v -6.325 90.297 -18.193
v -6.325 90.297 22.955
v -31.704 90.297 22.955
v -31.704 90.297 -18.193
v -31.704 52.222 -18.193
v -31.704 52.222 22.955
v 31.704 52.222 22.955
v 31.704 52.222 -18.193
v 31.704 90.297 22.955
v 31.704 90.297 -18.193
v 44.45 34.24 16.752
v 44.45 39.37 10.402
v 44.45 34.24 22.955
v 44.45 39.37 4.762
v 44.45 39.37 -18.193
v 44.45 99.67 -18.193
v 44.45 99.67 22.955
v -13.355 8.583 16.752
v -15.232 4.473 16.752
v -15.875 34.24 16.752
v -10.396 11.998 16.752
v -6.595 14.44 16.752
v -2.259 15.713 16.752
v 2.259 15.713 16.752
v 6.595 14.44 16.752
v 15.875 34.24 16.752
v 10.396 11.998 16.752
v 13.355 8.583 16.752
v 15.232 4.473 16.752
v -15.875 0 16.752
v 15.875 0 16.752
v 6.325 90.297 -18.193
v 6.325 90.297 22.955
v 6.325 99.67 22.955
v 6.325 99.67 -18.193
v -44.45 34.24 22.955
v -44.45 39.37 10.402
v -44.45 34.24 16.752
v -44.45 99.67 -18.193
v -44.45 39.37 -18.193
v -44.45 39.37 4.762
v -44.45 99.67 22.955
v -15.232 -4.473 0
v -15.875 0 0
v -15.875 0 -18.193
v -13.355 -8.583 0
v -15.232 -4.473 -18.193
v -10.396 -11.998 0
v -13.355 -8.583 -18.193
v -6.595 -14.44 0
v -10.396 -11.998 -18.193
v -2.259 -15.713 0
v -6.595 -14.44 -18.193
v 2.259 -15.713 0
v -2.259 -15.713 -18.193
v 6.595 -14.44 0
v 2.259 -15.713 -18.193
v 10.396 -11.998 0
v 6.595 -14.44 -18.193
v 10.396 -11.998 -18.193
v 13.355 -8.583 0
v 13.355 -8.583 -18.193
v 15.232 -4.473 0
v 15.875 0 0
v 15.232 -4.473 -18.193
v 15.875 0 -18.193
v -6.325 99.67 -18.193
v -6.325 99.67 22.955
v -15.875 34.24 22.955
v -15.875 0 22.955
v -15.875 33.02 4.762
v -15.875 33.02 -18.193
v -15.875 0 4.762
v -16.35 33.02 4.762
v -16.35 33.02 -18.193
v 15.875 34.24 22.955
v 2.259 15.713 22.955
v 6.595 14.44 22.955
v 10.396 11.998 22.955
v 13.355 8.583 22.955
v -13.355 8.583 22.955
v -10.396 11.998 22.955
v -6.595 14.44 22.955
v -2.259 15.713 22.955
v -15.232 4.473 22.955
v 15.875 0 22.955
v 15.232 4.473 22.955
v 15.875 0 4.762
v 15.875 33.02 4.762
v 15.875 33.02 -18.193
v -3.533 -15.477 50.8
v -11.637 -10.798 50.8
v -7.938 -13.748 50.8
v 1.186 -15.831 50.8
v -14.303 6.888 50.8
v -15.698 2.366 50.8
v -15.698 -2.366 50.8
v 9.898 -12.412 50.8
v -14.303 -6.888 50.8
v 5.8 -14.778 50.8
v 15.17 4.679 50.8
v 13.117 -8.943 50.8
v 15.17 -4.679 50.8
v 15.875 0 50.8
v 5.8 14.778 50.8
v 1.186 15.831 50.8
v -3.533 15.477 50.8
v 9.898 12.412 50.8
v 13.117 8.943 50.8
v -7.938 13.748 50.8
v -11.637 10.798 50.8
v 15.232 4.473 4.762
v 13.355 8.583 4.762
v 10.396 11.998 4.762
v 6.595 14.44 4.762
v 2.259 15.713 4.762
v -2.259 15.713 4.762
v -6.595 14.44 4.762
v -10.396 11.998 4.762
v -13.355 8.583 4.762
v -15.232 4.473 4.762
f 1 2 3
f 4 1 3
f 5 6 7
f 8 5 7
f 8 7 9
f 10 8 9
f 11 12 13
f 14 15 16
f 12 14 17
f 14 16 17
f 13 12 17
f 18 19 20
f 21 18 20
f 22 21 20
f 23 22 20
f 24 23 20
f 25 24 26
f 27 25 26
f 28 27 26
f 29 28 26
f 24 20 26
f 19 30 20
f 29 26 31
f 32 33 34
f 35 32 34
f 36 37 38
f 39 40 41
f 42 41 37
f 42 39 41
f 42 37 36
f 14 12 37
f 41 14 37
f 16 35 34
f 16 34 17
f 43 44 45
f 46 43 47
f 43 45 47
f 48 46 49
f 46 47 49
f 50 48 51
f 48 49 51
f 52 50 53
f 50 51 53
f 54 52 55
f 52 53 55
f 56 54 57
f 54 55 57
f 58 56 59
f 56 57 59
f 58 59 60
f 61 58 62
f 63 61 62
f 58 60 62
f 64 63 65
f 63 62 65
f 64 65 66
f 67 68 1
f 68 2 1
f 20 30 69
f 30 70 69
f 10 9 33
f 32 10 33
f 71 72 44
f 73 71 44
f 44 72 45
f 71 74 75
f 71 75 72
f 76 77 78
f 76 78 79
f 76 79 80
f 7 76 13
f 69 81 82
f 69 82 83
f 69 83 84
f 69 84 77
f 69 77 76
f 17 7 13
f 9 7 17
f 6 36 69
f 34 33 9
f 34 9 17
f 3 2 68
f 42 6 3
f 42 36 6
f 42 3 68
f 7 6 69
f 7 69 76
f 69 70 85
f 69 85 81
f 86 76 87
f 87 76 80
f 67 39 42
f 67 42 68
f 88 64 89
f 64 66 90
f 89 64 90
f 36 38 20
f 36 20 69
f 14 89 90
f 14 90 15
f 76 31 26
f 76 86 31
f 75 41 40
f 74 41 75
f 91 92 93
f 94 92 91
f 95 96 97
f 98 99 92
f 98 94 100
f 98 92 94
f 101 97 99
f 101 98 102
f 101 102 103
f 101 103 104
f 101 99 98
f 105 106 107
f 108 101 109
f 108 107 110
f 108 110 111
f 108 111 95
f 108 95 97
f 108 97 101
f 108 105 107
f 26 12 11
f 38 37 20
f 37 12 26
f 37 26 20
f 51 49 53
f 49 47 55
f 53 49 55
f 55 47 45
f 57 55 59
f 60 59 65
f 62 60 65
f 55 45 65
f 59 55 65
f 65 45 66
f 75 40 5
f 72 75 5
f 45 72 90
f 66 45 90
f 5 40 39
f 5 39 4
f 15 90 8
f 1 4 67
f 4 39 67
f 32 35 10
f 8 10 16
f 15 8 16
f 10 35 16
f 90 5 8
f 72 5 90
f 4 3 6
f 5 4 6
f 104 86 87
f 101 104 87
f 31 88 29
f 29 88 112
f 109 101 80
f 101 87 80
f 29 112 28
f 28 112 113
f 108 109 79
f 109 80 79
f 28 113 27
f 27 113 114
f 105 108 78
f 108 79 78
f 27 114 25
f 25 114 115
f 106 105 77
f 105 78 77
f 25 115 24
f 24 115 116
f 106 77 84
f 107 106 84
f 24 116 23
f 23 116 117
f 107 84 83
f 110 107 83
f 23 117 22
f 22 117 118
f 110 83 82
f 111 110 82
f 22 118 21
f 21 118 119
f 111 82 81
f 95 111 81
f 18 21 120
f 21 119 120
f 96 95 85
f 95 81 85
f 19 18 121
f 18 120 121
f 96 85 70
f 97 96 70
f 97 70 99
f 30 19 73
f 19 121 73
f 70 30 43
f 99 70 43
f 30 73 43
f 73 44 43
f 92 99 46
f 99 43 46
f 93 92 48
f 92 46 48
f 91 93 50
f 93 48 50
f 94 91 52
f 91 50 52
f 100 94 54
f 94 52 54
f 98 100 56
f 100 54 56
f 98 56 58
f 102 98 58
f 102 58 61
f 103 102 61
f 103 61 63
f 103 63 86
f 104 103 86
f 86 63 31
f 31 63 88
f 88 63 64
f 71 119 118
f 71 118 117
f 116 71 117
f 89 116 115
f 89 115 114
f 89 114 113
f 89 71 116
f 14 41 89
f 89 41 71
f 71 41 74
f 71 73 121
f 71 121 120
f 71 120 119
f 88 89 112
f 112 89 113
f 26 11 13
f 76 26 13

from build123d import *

# Parameters (mm, degrees)
SKETCH1_R                = 15.875
BOSS_EXTRUDE1_DEPTH      = 50.8
SKETCH2_W                = 31.75
SKETCH2_H                = 50.8
BOSS_EXTRUDE2_DEPTH      = 4.7625
SKETCH3_W                = 88.9
SKETCH3_H                = 41.148
BOSS_EXTRUDE3_DEPTH      = 41.2496
CUT_EXTRUDE2_DEPTH       = 111.191148756
BOSS_EXTRUDE4_REACH      = 96.879
BOSS_EXTRUDE4_END_RADIUS = 15.875
SKETCH12_W               = 31.75
SKETCH12_H               = 6.203370687
SKETCH13_W               = 31.75
SKETCH13_H               = 4.7625
BOSS_EXTRUDE5_DEPTH      = 11.43
SKETCH14_W               = 38.1254
SKETCH14_H               = 41.148
BOSS_EXTRUDE6_DEPTH      = 7.62
SKETCH20_W               = 31.75
SKETCH20_H               = 5.130323172
BOSS_EXTRUDE7_DEPTH      = 6.35
CUT_EXTRUDE3_DEPTH       = 128.097501113
BOSS_EXTRUDE8_START      = 18.19275
BOSS_EXTRUDE8_DEPTH      = 18.19275
SKETCH25_W               = 28.575
SKETCH25_H               = 22.95525
BOSS_EXTRUDE10_DEPTH     = 6.35
CUT_EXTRUDE4_DEPTH       = 119.44527458
BOSS_EXTRUDE11_DEPTH     = 28.575
BOSS_EXTRUDE12_DEPTH     = 28.575


with BuildPart() as part:
    # Sketch1 → Boss-Extrude1 (new body)
    with BuildSketch(Plane.XY):
        Circle(SKETCH1_R)
    extrude(amount=BOSS_EXTRUDE1_DEPTH)

    # Sketch2 → Boss-Extrude2 (add)
    with BuildSketch(Plane(origin=(0, 0, 0), x_dir=(-1, 0, 0), z_dir=(0, 0, -1))):
        with Locations((0, 25.4)):
            Rectangle(SKETCH2_W, SKETCH2_H)
    extrude(amount=-BOSS_EXTRUDE2_DEPTH)

    # Sketch3 → Boss-Extrude3 (add)
    with BuildSketch(Plane(origin=(0, 50.8, 0), x_dir=(1, 0, 0), z_dir=(0, 1, 0))):
        with Locations((0, -2.38125)):
            Rectangle(SKETCH3_W, SKETCH3_H)
    extrude(amount=BOSS_EXTRUDE3_DEPTH)

    # Sketch5 → Cut-Extrude2 (cut, through all)
    with BuildSketch(Plane.XY.offset(22.95525)):
        Polygon((-6.3246, 92.0496), (-6.3246, 90.297), (-31.70428, 90.297), (-31.70428, 52.2224), (31.70428, 52.2224), (31.70428, 90.297), (6.3246, 90.297), (6.3246, 92.0496), align=None)
    extrude(amount=-CUT_EXTRUDE2_DEPTH, mode=Mode.SUBTRACT)

    # Boss-Extrude4: up to this cylinder (the profile starts outside it)
    boss_extrude4_end = Plane(origin=(0, 0, 19.853565), z_dir=(0, 0, -1)) * Cylinder(BOSS_EXTRUDE4_END_RADIUS, 226.508, mode=Mode.PRIVATE)
    # Sketch12 → Boss-Extrude4 (add, up to the surface)
    with BuildSketch(Plane.XZ.offset(-50.8), mode=Mode.PRIVATE) as boss_extrude4_sk1:
        with Locations((0, 19.853564657)):
            Rectangle(SKETCH12_W, SKETCH12_H)
    boss_extrude4_tool1 = extrude(boss_extrude4_sk1.sketch, amount=BOSS_EXTRUDE4_REACH, mode=Mode.PRIVATE) - boss_extrude4_end
    add(boss_extrude4_tool1.solids().sort_by_distance((0, 50.8, 19.853565))[0])

    # Sketch13 → Boss-Extrude5 (add)
    with BuildSketch(Plane.XZ.offset(-50.8)):
        Polygon((-44.45, 22.95525), (-15.875, 22.95525), (-15.875, 16.751879313), (15.875, 16.751879313), (15.875, 22.95525), (44.45, 22.95525), (44.45, -18.19275), (-44.45, -18.19275), align=None)
        with Locations((0, 2.38125)):
            Rectangle(SKETCH13_W, SKETCH13_H, mode=Mode.SUBTRACT)
    extrude(amount=BOSS_EXTRUDE5_DEPTH)

    # Sketch14 → Boss-Extrude6 (add)
    with BuildSketch(Plane(origin=(0, 92.0496, 0), x_dir=(1, 0, 0), z_dir=(0, 1, 0))):
        with Locations((-25.3873, -2.38125)):
            Rectangle(SKETCH14_W, SKETCH14_H)
        with Locations((25.3873, -2.38125)):
            Rectangle(SKETCH14_W, SKETCH14_H)
    extrude(amount=BOSS_EXTRUDE6_DEPTH)

    # Sketch20 → Boss-Extrude7 (add)
    with BuildSketch(Plane(origin=(0, 0, 16.751879313), x_dir=(-1, 0, 0), z_dir=(0, 0, -1))):
        with Locations((0, 36.804838414)):
            Rectangle(SKETCH20_W, SKETCH20_H)
    extrude(amount=BOSS_EXTRUDE7_DEPTH)

    # Sketch21 → Cut-Extrude3 (cut, through all)
    with BuildSketch(Plane(origin=(15.875, 0, 0), x_dir=(0, 0, -1), z_dir=(1, 0, 0))):
        Polygon((-16.751879313, 34.239676828), (-10.401879313, 39.37), (-10.401879313, 34.239676828), align=None)
    extrude(amount=-CUT_EXTRUDE3_DEPTH, mode=Mode.SUBTRACT)

    # Sketch22 → Boss-Extrude8 (add)
    with BuildSketch(Plane(origin=(0, 0, 0), x_dir=(-1, 0, 0), z_dir=(0, 0, -1)).offset(BOSS_EXTRUDE8_START)):
        with BuildLine():
            Line((-15.875, 39.37), (15.875, 39.37))
            Line((15.875, 39.37), (15.875, 0))
            ThreePointArc((15.875, 0), (0, -15.875), (-15.875, 0))
            Line((-15.875, 0), (-15.875, 39.37))
        make_face()
    extrude(amount=-BOSS_EXTRUDE8_DEPTH)

    # Sketch25 → Boss-Extrude10 (add)
    with BuildSketch(Plane.XZ.offset(-39.37)):
        with Locations((-30.1625, -6.715125)):
            Rectangle(SKETCH25_W, SKETCH25_H)
        with Locations((30.1625, -6.715125)):
            Rectangle(SKETCH25_W, SKETCH25_H)
    extrude(amount=BOSS_EXTRUDE10_DEPTH)

    # Sketch26 → Cut-Extrude4 (cut, through all)
    with BuildSketch(Plane.XY.offset(4.7625)):
        Polygon((-44.45, 39.37), (-16.350375035, 33.02), (-44.45, 33.02), align=None)
        Polygon((15.875, 33.02), (44.45, 39.37), (44.45, 33.02), align=None)
    extrude(amount=-CUT_EXTRUDE4_DEPTH, mode=Mode.SUBTRACT)

    # Sketch27 → Boss-Extrude11 (add)
    with BuildSketch(Plane.ZY.offset(15.875)):
        Polygon((16.751879313, 34.239676828), (22.95525, 34.239676828), (22.95525, 39.37), (10.401879313, 39.37), align=None)
    extrude(amount=BOSS_EXTRUDE11_DEPTH)

    # Sketch28 → Boss-Extrude12 (add)
    with BuildSketch(Plane(origin=(15.875, 0, 0), x_dir=(0, 0, -1), z_dir=(1, 0, 0))):
        Polygon((-16.751879313, 34.239676828), (-22.95525, 34.239676828), (-22.95525, 39.37), (-10.401879313, 39.37), align=None)
    extrude(amount=BOSS_EXTRUDE12_DEPTH)


solid = part.part
